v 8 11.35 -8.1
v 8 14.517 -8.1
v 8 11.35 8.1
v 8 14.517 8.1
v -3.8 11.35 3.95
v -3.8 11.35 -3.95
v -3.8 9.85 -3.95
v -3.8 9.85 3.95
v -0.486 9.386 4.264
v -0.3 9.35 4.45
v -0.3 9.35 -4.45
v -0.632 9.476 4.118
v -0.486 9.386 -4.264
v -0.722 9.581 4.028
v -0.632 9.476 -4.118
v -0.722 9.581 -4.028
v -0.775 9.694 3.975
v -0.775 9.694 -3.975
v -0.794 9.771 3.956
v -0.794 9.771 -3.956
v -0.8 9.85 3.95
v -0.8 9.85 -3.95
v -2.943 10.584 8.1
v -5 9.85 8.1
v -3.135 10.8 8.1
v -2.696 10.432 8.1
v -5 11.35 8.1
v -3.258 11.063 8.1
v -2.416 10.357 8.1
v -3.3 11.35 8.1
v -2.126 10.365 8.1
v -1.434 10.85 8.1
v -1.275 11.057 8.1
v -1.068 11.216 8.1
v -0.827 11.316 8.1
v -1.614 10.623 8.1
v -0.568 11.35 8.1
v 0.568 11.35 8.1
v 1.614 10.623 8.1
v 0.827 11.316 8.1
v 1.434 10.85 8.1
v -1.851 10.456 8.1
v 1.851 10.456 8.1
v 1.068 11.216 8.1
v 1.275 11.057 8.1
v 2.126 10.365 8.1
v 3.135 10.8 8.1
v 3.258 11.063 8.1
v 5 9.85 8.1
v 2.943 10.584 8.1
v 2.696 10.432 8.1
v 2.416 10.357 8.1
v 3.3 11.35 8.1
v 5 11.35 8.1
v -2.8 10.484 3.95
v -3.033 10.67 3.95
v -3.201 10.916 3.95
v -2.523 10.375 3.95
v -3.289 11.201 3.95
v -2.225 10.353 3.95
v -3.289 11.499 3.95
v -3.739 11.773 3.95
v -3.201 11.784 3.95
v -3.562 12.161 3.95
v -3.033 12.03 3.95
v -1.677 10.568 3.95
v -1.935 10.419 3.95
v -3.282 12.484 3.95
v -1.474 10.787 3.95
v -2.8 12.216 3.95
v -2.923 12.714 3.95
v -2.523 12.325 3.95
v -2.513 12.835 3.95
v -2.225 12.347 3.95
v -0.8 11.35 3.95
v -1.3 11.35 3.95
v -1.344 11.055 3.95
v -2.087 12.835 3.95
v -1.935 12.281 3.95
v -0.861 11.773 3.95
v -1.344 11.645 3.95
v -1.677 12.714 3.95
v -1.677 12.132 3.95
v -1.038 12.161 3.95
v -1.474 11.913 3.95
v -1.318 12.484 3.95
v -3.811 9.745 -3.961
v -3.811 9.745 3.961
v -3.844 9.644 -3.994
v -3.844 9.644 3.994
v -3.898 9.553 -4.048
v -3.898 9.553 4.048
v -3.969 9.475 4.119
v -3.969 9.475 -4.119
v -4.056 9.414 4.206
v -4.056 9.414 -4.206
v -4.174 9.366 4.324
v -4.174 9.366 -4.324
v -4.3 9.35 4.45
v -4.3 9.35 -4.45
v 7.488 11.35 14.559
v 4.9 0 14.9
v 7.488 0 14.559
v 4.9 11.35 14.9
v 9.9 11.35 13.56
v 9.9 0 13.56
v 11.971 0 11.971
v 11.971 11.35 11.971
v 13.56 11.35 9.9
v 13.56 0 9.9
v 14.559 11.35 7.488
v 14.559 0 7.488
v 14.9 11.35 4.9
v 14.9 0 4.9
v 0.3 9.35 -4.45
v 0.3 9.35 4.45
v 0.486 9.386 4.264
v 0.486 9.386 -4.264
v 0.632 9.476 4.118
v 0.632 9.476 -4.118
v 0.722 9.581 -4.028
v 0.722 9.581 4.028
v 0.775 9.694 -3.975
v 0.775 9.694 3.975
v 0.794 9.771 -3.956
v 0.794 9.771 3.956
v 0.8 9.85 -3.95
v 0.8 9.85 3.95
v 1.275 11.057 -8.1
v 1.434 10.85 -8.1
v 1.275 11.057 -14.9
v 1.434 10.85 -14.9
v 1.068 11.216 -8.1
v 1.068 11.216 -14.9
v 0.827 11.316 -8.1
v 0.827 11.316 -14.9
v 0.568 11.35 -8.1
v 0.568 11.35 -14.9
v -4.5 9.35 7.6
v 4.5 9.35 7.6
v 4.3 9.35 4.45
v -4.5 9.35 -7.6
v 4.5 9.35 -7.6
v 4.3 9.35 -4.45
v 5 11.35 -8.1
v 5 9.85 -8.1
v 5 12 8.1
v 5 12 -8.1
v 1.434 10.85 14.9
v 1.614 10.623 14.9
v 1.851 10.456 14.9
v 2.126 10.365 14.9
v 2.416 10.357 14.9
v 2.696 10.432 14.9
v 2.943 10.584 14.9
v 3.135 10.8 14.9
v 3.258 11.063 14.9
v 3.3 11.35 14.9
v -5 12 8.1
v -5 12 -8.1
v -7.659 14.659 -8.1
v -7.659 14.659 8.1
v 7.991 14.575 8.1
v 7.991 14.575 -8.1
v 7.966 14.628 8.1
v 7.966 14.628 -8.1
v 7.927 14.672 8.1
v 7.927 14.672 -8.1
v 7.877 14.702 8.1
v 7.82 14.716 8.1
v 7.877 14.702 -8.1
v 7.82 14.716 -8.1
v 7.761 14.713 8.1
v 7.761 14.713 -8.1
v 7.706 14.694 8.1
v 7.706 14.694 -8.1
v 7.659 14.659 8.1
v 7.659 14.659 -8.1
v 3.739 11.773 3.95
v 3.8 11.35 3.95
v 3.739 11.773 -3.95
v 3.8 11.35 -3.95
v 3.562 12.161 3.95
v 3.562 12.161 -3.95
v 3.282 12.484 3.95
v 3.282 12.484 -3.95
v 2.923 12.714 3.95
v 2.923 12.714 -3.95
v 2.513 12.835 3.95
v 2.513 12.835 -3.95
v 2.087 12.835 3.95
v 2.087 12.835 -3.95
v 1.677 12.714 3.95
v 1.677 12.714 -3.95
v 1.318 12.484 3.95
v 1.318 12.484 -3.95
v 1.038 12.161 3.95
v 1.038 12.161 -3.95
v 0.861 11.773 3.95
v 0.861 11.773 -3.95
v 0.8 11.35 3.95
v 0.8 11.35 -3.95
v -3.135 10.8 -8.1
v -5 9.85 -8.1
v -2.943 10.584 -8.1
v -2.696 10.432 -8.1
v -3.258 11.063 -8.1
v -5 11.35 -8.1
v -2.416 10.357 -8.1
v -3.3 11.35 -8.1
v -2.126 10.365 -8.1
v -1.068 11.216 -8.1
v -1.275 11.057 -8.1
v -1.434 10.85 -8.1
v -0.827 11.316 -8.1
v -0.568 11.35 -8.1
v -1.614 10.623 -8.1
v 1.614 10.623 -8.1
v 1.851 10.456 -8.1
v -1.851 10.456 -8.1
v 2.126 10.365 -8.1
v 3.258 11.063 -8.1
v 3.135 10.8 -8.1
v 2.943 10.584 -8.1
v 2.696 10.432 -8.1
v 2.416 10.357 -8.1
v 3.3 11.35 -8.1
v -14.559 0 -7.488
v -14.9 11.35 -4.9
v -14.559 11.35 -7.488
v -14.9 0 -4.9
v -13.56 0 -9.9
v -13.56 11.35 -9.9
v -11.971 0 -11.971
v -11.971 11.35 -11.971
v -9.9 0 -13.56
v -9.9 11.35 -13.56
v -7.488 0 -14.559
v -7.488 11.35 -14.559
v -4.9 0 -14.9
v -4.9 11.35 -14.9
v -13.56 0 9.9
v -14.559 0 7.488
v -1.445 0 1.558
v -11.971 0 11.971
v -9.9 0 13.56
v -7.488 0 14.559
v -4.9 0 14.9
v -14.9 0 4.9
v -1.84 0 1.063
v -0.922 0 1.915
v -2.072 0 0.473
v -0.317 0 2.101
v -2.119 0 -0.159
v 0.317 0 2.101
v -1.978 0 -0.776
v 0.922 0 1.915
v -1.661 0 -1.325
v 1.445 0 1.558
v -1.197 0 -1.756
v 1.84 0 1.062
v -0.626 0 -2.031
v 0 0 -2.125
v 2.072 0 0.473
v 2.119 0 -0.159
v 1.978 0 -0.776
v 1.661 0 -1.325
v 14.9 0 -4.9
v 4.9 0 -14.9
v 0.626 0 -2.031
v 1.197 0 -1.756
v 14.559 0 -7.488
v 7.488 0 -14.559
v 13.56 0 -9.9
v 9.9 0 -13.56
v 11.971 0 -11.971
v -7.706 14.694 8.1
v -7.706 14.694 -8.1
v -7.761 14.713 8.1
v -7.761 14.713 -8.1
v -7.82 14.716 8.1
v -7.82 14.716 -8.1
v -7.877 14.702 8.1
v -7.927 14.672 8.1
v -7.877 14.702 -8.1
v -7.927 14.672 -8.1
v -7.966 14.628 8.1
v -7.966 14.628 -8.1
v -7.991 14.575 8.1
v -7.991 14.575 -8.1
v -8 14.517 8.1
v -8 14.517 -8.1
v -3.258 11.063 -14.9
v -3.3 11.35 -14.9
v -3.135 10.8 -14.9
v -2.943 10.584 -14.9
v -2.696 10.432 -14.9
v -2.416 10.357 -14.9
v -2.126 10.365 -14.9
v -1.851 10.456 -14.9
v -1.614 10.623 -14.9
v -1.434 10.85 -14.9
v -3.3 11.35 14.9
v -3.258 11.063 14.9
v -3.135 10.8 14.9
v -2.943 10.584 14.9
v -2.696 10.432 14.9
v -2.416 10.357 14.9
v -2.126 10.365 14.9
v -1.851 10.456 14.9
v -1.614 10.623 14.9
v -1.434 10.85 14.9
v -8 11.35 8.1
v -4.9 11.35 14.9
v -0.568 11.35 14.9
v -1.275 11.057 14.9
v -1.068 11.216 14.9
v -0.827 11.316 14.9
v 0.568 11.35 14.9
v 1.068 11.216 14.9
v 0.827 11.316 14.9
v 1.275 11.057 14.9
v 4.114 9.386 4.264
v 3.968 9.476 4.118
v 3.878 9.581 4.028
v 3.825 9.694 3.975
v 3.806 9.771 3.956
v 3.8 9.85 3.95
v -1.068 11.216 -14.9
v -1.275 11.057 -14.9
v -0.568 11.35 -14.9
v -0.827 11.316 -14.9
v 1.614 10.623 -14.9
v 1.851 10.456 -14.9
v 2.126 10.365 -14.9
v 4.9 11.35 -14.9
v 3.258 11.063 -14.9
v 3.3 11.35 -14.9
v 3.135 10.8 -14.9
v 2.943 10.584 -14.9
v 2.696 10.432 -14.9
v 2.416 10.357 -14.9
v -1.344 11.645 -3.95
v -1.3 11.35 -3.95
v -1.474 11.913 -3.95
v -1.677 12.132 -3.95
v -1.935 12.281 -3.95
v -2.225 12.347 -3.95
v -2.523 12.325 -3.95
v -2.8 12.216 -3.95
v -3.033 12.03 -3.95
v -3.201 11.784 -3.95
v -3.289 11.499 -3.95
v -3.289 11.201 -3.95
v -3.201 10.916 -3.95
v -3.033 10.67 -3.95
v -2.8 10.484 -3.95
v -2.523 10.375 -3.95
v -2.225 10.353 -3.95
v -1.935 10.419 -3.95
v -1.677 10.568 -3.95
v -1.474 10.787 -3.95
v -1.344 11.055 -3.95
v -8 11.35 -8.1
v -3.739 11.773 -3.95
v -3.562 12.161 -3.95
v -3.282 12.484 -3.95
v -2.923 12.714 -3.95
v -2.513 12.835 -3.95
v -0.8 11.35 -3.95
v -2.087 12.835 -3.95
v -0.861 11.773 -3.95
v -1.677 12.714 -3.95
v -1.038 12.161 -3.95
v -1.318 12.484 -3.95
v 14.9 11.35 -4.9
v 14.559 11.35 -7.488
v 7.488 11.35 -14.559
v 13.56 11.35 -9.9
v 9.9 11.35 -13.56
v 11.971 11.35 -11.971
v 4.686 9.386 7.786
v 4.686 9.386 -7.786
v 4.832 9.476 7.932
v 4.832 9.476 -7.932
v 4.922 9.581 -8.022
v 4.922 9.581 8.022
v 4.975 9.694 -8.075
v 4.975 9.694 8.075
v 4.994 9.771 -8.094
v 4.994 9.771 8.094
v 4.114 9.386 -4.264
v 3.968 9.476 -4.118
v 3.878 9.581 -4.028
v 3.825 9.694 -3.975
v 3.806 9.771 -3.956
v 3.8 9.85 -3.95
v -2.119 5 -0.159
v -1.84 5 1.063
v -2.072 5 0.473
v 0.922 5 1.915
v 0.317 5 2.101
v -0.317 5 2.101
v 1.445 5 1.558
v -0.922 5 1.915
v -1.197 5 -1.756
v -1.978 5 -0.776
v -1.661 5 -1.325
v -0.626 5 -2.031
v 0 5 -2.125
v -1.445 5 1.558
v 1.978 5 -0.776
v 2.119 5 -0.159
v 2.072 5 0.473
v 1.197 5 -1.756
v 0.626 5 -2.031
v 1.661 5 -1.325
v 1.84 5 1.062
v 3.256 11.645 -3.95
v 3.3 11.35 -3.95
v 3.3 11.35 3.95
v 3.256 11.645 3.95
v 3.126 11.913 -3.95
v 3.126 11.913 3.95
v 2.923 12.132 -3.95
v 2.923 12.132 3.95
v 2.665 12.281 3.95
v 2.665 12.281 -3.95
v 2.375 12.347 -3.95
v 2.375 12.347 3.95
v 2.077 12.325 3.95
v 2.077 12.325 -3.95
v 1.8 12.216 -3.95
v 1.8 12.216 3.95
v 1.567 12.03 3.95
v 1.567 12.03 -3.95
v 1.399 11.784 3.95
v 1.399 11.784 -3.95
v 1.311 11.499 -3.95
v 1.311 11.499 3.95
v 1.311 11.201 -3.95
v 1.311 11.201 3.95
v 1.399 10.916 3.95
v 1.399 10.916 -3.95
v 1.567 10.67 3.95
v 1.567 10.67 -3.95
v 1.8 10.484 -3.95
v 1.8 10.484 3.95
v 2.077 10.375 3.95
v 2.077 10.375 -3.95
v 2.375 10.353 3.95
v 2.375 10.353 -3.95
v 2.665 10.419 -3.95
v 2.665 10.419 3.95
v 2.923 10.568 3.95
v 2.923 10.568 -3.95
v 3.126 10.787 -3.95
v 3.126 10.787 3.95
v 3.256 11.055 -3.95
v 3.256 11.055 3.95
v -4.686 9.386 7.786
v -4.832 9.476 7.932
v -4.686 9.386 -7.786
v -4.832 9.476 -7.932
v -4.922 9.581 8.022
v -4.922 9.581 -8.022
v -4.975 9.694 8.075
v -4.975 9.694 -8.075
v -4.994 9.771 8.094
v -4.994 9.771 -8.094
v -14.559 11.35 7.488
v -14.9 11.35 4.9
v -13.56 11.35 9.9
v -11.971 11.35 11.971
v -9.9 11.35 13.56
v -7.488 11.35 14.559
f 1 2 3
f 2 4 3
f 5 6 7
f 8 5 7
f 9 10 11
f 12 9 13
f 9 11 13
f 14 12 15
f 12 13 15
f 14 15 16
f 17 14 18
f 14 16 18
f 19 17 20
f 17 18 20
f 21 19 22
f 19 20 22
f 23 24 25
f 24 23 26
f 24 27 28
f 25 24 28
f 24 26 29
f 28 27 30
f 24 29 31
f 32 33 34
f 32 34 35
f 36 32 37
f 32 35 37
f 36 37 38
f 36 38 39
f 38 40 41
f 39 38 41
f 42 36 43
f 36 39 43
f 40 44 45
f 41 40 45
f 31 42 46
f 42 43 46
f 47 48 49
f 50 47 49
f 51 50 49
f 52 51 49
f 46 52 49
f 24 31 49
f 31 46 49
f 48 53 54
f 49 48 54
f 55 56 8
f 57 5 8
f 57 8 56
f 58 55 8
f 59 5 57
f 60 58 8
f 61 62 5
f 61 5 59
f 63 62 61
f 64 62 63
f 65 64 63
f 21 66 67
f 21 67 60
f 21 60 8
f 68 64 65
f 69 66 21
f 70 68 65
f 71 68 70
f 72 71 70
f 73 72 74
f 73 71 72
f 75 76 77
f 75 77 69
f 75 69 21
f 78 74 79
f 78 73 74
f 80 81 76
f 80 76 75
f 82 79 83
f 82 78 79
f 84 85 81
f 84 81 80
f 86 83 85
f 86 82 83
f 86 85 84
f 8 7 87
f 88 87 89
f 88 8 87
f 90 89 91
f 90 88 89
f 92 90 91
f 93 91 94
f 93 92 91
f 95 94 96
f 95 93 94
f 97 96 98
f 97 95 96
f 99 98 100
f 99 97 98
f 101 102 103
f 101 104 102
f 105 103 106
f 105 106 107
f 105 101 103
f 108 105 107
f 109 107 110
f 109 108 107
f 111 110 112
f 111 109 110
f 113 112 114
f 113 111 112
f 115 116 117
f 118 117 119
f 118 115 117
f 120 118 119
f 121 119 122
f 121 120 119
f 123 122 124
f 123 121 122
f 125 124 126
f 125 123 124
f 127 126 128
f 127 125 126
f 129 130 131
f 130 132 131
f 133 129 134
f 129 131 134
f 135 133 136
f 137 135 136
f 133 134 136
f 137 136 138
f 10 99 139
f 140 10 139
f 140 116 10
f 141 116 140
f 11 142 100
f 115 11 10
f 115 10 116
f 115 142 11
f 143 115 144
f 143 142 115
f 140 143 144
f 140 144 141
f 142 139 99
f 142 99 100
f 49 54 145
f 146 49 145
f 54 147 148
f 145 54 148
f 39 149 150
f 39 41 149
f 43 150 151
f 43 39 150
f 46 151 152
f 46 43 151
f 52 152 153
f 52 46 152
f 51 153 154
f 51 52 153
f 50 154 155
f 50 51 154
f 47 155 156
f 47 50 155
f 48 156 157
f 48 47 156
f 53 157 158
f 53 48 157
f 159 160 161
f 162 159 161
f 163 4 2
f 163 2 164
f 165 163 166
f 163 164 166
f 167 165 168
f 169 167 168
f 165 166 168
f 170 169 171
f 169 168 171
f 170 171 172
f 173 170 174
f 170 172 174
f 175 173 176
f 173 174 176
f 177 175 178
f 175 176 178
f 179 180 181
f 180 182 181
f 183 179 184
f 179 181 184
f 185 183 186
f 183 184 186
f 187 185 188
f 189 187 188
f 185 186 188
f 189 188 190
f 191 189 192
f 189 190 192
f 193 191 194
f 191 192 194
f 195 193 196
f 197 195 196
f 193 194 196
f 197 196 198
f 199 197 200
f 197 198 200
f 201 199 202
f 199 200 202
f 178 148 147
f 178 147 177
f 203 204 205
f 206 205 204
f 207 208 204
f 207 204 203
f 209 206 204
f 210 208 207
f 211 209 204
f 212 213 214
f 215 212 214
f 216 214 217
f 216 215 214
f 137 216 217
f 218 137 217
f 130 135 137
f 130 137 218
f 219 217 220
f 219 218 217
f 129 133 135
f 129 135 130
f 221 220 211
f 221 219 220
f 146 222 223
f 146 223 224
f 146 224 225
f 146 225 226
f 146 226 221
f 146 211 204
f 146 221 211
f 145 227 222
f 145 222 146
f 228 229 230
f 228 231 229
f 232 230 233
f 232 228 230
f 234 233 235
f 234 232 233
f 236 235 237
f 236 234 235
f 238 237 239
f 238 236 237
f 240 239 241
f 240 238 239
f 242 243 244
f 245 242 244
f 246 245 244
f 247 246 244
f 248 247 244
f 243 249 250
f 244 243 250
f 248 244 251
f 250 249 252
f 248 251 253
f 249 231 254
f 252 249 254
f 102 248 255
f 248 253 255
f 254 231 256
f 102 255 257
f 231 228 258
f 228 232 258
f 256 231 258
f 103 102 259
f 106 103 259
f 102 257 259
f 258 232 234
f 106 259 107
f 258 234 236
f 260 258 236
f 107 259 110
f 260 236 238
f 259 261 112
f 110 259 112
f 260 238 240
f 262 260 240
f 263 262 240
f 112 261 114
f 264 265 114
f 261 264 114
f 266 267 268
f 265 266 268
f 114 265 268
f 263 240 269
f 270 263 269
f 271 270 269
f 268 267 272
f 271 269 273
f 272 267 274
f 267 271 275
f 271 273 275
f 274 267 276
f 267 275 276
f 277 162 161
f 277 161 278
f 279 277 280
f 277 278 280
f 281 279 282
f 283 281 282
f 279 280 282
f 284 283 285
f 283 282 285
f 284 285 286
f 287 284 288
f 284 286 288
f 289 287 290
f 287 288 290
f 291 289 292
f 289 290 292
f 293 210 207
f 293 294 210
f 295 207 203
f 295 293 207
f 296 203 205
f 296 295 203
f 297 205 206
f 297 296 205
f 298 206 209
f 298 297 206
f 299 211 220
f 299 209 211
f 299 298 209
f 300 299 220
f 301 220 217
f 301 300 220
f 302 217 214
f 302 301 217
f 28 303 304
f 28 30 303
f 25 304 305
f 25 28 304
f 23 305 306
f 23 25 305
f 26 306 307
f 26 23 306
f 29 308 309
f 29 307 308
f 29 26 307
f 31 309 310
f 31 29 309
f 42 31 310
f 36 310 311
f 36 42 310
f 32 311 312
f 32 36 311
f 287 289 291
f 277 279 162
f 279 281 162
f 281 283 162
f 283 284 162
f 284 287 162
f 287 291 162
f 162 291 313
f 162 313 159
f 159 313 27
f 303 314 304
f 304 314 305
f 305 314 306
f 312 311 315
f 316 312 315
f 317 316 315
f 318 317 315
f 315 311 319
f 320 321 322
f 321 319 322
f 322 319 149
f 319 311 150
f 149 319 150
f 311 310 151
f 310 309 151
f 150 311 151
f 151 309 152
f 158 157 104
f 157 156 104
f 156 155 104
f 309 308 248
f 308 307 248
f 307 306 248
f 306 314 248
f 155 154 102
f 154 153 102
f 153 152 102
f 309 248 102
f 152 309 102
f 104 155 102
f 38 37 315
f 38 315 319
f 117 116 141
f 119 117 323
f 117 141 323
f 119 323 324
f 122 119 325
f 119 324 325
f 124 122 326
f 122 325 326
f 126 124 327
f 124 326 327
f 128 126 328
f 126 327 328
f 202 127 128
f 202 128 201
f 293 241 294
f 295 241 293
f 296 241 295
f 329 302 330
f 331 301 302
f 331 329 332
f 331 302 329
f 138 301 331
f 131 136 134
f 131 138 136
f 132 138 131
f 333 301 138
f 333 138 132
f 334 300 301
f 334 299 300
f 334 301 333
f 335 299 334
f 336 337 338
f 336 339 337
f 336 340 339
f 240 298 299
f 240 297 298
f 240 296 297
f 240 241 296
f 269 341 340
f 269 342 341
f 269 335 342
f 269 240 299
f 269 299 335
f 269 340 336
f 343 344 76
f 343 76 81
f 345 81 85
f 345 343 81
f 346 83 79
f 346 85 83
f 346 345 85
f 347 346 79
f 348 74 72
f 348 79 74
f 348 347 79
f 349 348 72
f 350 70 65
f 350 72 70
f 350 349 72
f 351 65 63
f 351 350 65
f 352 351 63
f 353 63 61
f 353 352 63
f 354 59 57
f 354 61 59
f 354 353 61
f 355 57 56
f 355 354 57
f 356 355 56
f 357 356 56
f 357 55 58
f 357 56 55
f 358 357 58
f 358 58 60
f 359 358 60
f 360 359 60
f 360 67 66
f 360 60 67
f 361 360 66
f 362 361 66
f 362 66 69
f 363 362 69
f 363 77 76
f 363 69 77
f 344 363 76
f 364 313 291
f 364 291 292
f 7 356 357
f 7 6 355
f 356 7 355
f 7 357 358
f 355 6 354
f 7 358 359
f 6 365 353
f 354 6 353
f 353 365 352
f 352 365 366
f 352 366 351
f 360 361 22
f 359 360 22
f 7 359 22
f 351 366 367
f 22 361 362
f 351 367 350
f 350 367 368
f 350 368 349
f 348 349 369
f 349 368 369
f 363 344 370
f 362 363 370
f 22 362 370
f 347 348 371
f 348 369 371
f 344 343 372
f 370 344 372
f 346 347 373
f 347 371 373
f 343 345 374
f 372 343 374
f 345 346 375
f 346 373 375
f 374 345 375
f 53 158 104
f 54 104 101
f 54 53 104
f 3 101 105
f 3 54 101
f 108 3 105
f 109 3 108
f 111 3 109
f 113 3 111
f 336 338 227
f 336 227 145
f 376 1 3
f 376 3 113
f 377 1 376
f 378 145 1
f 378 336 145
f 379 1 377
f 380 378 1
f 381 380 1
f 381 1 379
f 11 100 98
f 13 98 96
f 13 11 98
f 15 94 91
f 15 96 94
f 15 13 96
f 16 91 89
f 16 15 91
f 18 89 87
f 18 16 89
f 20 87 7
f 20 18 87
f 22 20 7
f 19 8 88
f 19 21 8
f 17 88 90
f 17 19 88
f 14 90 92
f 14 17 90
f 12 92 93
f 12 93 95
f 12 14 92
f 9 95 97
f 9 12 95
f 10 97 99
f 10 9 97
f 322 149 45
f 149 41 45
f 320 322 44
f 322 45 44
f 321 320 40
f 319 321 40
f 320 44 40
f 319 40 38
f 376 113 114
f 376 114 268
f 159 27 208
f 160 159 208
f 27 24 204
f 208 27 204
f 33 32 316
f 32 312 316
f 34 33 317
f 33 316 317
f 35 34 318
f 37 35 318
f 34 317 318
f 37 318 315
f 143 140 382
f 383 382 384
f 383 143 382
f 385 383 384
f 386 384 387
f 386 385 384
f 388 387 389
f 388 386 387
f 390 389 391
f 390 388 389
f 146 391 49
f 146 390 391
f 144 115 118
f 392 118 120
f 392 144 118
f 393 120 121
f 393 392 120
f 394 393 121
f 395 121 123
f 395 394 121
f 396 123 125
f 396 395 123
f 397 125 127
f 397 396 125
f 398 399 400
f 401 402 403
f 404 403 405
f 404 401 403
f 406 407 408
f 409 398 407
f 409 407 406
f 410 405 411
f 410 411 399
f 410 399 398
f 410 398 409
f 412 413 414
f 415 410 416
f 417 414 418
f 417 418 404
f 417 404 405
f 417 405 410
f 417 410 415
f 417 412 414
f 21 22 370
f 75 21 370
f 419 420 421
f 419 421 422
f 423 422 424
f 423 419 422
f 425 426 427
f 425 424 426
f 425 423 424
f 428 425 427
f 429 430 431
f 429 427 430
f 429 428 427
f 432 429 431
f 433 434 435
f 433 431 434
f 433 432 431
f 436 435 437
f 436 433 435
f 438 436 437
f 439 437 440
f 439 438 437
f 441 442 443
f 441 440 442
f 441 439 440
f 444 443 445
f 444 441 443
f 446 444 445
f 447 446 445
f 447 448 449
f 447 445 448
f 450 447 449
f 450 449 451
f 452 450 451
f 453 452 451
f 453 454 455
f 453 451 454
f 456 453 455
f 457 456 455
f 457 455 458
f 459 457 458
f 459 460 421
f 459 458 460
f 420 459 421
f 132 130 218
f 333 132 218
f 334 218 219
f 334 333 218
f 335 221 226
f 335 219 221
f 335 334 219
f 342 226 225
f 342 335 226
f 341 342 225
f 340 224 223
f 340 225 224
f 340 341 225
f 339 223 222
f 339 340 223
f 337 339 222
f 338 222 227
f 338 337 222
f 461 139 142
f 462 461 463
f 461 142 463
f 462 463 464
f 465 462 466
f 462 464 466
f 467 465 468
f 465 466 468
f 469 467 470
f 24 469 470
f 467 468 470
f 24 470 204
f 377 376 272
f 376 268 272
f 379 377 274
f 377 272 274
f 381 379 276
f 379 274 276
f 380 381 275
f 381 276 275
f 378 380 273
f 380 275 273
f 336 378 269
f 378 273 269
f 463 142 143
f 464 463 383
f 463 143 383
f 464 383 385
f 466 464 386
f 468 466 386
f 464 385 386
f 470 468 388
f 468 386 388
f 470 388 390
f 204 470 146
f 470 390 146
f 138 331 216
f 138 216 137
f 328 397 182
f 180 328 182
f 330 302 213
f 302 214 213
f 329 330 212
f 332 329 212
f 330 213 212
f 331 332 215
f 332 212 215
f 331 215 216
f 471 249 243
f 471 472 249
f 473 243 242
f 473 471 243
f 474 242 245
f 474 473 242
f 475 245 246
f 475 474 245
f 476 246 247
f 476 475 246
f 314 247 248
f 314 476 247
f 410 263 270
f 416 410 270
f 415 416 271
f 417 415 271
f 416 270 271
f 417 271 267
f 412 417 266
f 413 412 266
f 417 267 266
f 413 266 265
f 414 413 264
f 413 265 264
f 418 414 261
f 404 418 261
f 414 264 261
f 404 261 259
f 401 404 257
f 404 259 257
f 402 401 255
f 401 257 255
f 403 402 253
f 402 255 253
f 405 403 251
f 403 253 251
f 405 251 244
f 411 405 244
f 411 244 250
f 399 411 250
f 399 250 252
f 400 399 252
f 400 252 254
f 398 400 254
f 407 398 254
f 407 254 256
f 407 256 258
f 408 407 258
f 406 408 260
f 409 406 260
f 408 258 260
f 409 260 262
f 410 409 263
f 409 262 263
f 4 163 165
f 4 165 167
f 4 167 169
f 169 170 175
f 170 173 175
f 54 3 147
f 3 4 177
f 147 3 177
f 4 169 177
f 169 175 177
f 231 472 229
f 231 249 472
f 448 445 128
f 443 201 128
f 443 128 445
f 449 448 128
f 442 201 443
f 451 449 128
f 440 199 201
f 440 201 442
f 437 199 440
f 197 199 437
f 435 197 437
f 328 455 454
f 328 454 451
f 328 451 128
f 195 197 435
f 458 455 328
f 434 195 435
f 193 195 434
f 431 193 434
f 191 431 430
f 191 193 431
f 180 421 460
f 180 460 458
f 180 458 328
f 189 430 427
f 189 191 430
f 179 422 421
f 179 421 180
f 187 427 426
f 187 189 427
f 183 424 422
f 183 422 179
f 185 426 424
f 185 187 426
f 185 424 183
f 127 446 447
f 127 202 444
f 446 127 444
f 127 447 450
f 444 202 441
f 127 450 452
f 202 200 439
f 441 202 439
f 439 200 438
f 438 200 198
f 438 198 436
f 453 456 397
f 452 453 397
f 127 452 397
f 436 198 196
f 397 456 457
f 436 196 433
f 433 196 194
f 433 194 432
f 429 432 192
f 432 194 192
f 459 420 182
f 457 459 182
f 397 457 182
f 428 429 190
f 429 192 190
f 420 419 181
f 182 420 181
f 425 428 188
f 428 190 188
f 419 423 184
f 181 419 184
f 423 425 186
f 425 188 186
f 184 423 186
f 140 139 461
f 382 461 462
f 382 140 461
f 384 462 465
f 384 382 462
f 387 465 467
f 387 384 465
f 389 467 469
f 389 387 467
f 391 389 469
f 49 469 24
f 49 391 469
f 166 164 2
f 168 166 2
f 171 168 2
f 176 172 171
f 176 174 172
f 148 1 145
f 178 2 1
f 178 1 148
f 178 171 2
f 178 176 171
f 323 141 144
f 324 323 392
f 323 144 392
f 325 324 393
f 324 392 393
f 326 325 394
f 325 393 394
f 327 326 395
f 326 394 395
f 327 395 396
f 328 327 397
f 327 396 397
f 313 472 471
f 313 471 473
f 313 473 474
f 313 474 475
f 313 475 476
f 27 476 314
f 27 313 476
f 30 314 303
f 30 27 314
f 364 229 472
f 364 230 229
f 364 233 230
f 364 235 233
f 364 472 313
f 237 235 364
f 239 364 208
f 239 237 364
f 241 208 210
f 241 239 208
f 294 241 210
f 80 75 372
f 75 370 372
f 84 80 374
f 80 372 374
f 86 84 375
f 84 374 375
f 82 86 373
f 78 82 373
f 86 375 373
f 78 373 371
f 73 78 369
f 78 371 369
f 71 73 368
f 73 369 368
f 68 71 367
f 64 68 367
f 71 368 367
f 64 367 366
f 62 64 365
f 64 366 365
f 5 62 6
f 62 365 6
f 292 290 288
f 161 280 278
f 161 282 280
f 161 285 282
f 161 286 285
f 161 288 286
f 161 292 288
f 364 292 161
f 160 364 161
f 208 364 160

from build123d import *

# Parameters (mm, degrees)
SKETCH2_W               = 29.8
SKETCH2_H               = 29.8
BOSS_EXTRUDE1_DEPTH     = 6.35
SKETCH3_W               = 29.8
SKETCH3_H               = 29.8
BOSS_EXTRUDE2_DEPTH     = 5
FILLET1_R               = 10
SKETCH5_W               = 10
SKETCH5_H               = 16.2
CUT_EXTRUDE1_DEPTH      = 2
SKETCH4_W               = 1.5
SKETCH4_H               = 7.9
SKETCH4_4_W             = 1.5
SKETCH4_4_H             = 7.9
SKETCH6_W               = 3
SKETCH6_H               = 5
BOSS_EXTRUDE3_DEPTH     = 7.9
FILLET3_R               = 0.5
CUT_EXTRUDE2_DEPTH      = 28.248027452
CUT_EXTRUDE2_DEPTH_BACK = 28.248027452
SKETCH7_R               = 1
SKETCH8_R               = 2.125
CUT_EXTRUDE3_DEPTH      = 5
SKETCH9_W               = 3
SKETCH9_H               = 16.2
BOSS_EXTRUDE4_DEPTH     = 0.65
BOSS_EXTRUDE5_DEPTH     = 16.2
FILLET4_R               = 0.2
FILLET5_R               = 1


with BuildPart() as part:
    # Sketch2 → Boss-Extrude1 (new body)
    with BuildSketch(Plane(origin=(0, 0, 0), x_dir=(1, 0, 0), z_dir=(0, 1, 0))):
        Rectangle(SKETCH2_W, SKETCH2_H)
    extrude(amount=BOSS_EXTRUDE1_DEPTH)

    # Sketch3 → Boss-Extrude2 (add)
    with BuildSketch(Plane(origin=(0, 6.35, 0), x_dir=(1, 0, 0), z_dir=(0, 1, 0))):
        Rectangle(SKETCH3_W, SKETCH3_H)
    extrude(amount=BOSS_EXTRUDE2_DEPTH)

    # Fillet1
    fillet1_edges = [part.edges().sort_by_distance(p)[0] for p in [
        (-14.9, 5.675, -14.9),
        (14.9, 5.675, -14.9),
        (14.9, 5.675, 14.9),
        (-14.9, 5.675, 14.9),
    ]]
    fillet(fillet1_edges, radius=FILLET1_R)

    # Sketch5 → Cut-Extrude1 (cut)
    with BuildSketch(Plane(origin=(0, 11.35, 0), x_dir=(1, 0, 0), z_dir=(0, 1, 0))):
        Rectangle(SKETCH5_W, SKETCH5_H)
    extrude(amount=-CUT_EXTRUDE1_DEPTH, mode=Mode.SUBTRACT)



with BuildPart() as body_2:
    # Sketch4 → Revolve1 (revolve)
    with BuildSketch(Plane(origin=(0, 11.35, 0), x_dir=(1, 0, 0), z_dir=(0, 1, 0))):
        with Locations((-3.05, 0)):
            Rectangle(SKETCH4_W, SKETCH4_H)
    revolve(axis=Axis((-2.3, 11.35, -3.95), (0, 0, 1)))


with BuildPart() as body_3:
    # Sketch4<4> → Revolve2 (revolve)
    with BuildSketch(Plane(origin=(0, 11.35, 0), x_dir=(1, 0, 0), z_dir=(0, 1, 0)), mode=Mode.PRIVATE) as revolve2_sk:
        with Locations((3.05, 0)):
            Rectangle(SKETCH4_4_W, SKETCH4_4_H)
    revolve(revolve2_sk.sketch.rotate(Axis((2.3, 11.35, -3.95), (0, 0, 1)), 180), axis=Axis((2.3, 11.35, -3.95), (0, 0, 1)))


with BuildPart() as part_1:
    add(part.part)

    add(body_2.part)  # Boss-Extrude3 merges body 2

    add(body_3.part)  # Boss-Extrude3 merges body 3
    # Sketch6 → Boss-Extrude3 (add)
    with BuildSketch(Plane.XY.offset(3.95)):
        with BuildLine():
            ThreePointArc((-0.8, 11.35), (-2.3, 9.85), (-3.8, 11.35))
            Line((-3.8, 11.35), (-3.8, 6.35))
            Line((-3.8, 6.35), (-0.8, 6.35))
            Line((-0.8, 6.35), (-0.8, 11.35))
        make_face()
        with Locations((2.3, 8.85)):
            Rectangle(SKETCH6_W, SKETCH6_H)
        with BuildLine():
            ThreePointArc((-0.8, 11.35), (-2.3, 12.85), (-3.8, 11.35))
            Line((-3.8, 11.35), (-0.8, 11.35))
        make_face()
        with BuildLine():
            Line((-0.8, 11.35), (-3.8, 11.35))
            ThreePointArc((-3.8, 11.35), (-2.3, 9.85), (-0.8, 11.35))
        make_face()
    extrude(amount=-BOSS_EXTRUDE3_DEPTH)

    # Fillet3
    fillet3_edges = [part_1.edges().sort_by_distance(p)[0] for p in [
        (-0.8, 9.35, 0),
        (-3.8, 9.35, 0),
        (-2.3, 9.35, 3.95),
        (-2.3, 9.35, -3.95),
        (5, 9.35, 0),
        (0, 9.35, -8.1),
        (-5, 9.35, 0),
        (0, 9.35, 8.1),
        (2.3, 9.35, -3.95),
        (0.8, 9.35, 0),
        (3.8, 9.35, 0),
        (2.3, 9.35, 3.95),
    ]]
    fillet(fillet3_edges, radius=FILLET3_R)

    # Sketch7 → Cut-Extrude2 (cut, two sides: drawn at the far end of the back side and taken through both)
    with BuildSketch(Plane.XY.offset(3.95).offset(-CUT_EXTRUDE2_DEPTH_BACK)):
        with Locations((2.3, 11.35)):
            Circle(SKETCH7_R)
        with Locations((-2.3, 11.35)):
            Circle(SKETCH7_R)
    extrude(amount=CUT_EXTRUDE2_DEPTH + CUT_EXTRUDE2_DEPTH_BACK, mode=Mode.SUBTRACT)

    # Sketch8 → Cut-Extrude3 (cut)
    with BuildSketch(Plane.XZ):
        with Locations(Location((0, 0, 0), (0, 0, 270))):
            Circle(SKETCH8_R)
    extrude(amount=-CUT_EXTRUDE3_DEPTH, mode=Mode.SUBTRACT)

    # Sketch9 → Boss-Extrude4 (add)
    with BuildSketch(Plane(origin=(0, 11.35, 0), x_dir=(1, 0, 0), z_dir=(0, 1, 0))):
        with Locations((-6.5, 0)):
            Rectangle(SKETCH9_W, SKETCH9_H)
        with Locations((6.5, 0)):
            Rectangle(SKETCH9_W, SKETCH9_H)
    extrude(amount=BOSS_EXTRUDE4_DEPTH)

    # Sketch10 → Boss-Extrude5 (add)
    with BuildSketch(Plane.XY.offset(8.1)):
        Polygon((8, 15), (8, 12), (5, 12), align=None)
        Polygon((-5, 12), (-8, 15), (-8, 12), align=None)
    extrude(amount=-BOSS_EXTRUDE5_DEPTH)

    # Fillet4
    fillet4_edges = [part_1.edges().sort_by_distance(p)[0] for p in [
        (8, 15, 0),
        (-8, 15, 0),
    ]]
    fillet(fillet4_edges, radius=FILLET4_R)

    # Fillet5
    fillet5_edges = [part_1.edges().sort_by_distance(p)[0] for p in [
        (1.3, 11.35, 11.5),
        (1.3, 11.35, -11.5),
        (-1.3, 11.35, 11.5),
        (-1.3, 11.35, -11.5),
    ]]
    fillet(fillet5_edges, radius=FILLET5_R)


solid = part_1.part
